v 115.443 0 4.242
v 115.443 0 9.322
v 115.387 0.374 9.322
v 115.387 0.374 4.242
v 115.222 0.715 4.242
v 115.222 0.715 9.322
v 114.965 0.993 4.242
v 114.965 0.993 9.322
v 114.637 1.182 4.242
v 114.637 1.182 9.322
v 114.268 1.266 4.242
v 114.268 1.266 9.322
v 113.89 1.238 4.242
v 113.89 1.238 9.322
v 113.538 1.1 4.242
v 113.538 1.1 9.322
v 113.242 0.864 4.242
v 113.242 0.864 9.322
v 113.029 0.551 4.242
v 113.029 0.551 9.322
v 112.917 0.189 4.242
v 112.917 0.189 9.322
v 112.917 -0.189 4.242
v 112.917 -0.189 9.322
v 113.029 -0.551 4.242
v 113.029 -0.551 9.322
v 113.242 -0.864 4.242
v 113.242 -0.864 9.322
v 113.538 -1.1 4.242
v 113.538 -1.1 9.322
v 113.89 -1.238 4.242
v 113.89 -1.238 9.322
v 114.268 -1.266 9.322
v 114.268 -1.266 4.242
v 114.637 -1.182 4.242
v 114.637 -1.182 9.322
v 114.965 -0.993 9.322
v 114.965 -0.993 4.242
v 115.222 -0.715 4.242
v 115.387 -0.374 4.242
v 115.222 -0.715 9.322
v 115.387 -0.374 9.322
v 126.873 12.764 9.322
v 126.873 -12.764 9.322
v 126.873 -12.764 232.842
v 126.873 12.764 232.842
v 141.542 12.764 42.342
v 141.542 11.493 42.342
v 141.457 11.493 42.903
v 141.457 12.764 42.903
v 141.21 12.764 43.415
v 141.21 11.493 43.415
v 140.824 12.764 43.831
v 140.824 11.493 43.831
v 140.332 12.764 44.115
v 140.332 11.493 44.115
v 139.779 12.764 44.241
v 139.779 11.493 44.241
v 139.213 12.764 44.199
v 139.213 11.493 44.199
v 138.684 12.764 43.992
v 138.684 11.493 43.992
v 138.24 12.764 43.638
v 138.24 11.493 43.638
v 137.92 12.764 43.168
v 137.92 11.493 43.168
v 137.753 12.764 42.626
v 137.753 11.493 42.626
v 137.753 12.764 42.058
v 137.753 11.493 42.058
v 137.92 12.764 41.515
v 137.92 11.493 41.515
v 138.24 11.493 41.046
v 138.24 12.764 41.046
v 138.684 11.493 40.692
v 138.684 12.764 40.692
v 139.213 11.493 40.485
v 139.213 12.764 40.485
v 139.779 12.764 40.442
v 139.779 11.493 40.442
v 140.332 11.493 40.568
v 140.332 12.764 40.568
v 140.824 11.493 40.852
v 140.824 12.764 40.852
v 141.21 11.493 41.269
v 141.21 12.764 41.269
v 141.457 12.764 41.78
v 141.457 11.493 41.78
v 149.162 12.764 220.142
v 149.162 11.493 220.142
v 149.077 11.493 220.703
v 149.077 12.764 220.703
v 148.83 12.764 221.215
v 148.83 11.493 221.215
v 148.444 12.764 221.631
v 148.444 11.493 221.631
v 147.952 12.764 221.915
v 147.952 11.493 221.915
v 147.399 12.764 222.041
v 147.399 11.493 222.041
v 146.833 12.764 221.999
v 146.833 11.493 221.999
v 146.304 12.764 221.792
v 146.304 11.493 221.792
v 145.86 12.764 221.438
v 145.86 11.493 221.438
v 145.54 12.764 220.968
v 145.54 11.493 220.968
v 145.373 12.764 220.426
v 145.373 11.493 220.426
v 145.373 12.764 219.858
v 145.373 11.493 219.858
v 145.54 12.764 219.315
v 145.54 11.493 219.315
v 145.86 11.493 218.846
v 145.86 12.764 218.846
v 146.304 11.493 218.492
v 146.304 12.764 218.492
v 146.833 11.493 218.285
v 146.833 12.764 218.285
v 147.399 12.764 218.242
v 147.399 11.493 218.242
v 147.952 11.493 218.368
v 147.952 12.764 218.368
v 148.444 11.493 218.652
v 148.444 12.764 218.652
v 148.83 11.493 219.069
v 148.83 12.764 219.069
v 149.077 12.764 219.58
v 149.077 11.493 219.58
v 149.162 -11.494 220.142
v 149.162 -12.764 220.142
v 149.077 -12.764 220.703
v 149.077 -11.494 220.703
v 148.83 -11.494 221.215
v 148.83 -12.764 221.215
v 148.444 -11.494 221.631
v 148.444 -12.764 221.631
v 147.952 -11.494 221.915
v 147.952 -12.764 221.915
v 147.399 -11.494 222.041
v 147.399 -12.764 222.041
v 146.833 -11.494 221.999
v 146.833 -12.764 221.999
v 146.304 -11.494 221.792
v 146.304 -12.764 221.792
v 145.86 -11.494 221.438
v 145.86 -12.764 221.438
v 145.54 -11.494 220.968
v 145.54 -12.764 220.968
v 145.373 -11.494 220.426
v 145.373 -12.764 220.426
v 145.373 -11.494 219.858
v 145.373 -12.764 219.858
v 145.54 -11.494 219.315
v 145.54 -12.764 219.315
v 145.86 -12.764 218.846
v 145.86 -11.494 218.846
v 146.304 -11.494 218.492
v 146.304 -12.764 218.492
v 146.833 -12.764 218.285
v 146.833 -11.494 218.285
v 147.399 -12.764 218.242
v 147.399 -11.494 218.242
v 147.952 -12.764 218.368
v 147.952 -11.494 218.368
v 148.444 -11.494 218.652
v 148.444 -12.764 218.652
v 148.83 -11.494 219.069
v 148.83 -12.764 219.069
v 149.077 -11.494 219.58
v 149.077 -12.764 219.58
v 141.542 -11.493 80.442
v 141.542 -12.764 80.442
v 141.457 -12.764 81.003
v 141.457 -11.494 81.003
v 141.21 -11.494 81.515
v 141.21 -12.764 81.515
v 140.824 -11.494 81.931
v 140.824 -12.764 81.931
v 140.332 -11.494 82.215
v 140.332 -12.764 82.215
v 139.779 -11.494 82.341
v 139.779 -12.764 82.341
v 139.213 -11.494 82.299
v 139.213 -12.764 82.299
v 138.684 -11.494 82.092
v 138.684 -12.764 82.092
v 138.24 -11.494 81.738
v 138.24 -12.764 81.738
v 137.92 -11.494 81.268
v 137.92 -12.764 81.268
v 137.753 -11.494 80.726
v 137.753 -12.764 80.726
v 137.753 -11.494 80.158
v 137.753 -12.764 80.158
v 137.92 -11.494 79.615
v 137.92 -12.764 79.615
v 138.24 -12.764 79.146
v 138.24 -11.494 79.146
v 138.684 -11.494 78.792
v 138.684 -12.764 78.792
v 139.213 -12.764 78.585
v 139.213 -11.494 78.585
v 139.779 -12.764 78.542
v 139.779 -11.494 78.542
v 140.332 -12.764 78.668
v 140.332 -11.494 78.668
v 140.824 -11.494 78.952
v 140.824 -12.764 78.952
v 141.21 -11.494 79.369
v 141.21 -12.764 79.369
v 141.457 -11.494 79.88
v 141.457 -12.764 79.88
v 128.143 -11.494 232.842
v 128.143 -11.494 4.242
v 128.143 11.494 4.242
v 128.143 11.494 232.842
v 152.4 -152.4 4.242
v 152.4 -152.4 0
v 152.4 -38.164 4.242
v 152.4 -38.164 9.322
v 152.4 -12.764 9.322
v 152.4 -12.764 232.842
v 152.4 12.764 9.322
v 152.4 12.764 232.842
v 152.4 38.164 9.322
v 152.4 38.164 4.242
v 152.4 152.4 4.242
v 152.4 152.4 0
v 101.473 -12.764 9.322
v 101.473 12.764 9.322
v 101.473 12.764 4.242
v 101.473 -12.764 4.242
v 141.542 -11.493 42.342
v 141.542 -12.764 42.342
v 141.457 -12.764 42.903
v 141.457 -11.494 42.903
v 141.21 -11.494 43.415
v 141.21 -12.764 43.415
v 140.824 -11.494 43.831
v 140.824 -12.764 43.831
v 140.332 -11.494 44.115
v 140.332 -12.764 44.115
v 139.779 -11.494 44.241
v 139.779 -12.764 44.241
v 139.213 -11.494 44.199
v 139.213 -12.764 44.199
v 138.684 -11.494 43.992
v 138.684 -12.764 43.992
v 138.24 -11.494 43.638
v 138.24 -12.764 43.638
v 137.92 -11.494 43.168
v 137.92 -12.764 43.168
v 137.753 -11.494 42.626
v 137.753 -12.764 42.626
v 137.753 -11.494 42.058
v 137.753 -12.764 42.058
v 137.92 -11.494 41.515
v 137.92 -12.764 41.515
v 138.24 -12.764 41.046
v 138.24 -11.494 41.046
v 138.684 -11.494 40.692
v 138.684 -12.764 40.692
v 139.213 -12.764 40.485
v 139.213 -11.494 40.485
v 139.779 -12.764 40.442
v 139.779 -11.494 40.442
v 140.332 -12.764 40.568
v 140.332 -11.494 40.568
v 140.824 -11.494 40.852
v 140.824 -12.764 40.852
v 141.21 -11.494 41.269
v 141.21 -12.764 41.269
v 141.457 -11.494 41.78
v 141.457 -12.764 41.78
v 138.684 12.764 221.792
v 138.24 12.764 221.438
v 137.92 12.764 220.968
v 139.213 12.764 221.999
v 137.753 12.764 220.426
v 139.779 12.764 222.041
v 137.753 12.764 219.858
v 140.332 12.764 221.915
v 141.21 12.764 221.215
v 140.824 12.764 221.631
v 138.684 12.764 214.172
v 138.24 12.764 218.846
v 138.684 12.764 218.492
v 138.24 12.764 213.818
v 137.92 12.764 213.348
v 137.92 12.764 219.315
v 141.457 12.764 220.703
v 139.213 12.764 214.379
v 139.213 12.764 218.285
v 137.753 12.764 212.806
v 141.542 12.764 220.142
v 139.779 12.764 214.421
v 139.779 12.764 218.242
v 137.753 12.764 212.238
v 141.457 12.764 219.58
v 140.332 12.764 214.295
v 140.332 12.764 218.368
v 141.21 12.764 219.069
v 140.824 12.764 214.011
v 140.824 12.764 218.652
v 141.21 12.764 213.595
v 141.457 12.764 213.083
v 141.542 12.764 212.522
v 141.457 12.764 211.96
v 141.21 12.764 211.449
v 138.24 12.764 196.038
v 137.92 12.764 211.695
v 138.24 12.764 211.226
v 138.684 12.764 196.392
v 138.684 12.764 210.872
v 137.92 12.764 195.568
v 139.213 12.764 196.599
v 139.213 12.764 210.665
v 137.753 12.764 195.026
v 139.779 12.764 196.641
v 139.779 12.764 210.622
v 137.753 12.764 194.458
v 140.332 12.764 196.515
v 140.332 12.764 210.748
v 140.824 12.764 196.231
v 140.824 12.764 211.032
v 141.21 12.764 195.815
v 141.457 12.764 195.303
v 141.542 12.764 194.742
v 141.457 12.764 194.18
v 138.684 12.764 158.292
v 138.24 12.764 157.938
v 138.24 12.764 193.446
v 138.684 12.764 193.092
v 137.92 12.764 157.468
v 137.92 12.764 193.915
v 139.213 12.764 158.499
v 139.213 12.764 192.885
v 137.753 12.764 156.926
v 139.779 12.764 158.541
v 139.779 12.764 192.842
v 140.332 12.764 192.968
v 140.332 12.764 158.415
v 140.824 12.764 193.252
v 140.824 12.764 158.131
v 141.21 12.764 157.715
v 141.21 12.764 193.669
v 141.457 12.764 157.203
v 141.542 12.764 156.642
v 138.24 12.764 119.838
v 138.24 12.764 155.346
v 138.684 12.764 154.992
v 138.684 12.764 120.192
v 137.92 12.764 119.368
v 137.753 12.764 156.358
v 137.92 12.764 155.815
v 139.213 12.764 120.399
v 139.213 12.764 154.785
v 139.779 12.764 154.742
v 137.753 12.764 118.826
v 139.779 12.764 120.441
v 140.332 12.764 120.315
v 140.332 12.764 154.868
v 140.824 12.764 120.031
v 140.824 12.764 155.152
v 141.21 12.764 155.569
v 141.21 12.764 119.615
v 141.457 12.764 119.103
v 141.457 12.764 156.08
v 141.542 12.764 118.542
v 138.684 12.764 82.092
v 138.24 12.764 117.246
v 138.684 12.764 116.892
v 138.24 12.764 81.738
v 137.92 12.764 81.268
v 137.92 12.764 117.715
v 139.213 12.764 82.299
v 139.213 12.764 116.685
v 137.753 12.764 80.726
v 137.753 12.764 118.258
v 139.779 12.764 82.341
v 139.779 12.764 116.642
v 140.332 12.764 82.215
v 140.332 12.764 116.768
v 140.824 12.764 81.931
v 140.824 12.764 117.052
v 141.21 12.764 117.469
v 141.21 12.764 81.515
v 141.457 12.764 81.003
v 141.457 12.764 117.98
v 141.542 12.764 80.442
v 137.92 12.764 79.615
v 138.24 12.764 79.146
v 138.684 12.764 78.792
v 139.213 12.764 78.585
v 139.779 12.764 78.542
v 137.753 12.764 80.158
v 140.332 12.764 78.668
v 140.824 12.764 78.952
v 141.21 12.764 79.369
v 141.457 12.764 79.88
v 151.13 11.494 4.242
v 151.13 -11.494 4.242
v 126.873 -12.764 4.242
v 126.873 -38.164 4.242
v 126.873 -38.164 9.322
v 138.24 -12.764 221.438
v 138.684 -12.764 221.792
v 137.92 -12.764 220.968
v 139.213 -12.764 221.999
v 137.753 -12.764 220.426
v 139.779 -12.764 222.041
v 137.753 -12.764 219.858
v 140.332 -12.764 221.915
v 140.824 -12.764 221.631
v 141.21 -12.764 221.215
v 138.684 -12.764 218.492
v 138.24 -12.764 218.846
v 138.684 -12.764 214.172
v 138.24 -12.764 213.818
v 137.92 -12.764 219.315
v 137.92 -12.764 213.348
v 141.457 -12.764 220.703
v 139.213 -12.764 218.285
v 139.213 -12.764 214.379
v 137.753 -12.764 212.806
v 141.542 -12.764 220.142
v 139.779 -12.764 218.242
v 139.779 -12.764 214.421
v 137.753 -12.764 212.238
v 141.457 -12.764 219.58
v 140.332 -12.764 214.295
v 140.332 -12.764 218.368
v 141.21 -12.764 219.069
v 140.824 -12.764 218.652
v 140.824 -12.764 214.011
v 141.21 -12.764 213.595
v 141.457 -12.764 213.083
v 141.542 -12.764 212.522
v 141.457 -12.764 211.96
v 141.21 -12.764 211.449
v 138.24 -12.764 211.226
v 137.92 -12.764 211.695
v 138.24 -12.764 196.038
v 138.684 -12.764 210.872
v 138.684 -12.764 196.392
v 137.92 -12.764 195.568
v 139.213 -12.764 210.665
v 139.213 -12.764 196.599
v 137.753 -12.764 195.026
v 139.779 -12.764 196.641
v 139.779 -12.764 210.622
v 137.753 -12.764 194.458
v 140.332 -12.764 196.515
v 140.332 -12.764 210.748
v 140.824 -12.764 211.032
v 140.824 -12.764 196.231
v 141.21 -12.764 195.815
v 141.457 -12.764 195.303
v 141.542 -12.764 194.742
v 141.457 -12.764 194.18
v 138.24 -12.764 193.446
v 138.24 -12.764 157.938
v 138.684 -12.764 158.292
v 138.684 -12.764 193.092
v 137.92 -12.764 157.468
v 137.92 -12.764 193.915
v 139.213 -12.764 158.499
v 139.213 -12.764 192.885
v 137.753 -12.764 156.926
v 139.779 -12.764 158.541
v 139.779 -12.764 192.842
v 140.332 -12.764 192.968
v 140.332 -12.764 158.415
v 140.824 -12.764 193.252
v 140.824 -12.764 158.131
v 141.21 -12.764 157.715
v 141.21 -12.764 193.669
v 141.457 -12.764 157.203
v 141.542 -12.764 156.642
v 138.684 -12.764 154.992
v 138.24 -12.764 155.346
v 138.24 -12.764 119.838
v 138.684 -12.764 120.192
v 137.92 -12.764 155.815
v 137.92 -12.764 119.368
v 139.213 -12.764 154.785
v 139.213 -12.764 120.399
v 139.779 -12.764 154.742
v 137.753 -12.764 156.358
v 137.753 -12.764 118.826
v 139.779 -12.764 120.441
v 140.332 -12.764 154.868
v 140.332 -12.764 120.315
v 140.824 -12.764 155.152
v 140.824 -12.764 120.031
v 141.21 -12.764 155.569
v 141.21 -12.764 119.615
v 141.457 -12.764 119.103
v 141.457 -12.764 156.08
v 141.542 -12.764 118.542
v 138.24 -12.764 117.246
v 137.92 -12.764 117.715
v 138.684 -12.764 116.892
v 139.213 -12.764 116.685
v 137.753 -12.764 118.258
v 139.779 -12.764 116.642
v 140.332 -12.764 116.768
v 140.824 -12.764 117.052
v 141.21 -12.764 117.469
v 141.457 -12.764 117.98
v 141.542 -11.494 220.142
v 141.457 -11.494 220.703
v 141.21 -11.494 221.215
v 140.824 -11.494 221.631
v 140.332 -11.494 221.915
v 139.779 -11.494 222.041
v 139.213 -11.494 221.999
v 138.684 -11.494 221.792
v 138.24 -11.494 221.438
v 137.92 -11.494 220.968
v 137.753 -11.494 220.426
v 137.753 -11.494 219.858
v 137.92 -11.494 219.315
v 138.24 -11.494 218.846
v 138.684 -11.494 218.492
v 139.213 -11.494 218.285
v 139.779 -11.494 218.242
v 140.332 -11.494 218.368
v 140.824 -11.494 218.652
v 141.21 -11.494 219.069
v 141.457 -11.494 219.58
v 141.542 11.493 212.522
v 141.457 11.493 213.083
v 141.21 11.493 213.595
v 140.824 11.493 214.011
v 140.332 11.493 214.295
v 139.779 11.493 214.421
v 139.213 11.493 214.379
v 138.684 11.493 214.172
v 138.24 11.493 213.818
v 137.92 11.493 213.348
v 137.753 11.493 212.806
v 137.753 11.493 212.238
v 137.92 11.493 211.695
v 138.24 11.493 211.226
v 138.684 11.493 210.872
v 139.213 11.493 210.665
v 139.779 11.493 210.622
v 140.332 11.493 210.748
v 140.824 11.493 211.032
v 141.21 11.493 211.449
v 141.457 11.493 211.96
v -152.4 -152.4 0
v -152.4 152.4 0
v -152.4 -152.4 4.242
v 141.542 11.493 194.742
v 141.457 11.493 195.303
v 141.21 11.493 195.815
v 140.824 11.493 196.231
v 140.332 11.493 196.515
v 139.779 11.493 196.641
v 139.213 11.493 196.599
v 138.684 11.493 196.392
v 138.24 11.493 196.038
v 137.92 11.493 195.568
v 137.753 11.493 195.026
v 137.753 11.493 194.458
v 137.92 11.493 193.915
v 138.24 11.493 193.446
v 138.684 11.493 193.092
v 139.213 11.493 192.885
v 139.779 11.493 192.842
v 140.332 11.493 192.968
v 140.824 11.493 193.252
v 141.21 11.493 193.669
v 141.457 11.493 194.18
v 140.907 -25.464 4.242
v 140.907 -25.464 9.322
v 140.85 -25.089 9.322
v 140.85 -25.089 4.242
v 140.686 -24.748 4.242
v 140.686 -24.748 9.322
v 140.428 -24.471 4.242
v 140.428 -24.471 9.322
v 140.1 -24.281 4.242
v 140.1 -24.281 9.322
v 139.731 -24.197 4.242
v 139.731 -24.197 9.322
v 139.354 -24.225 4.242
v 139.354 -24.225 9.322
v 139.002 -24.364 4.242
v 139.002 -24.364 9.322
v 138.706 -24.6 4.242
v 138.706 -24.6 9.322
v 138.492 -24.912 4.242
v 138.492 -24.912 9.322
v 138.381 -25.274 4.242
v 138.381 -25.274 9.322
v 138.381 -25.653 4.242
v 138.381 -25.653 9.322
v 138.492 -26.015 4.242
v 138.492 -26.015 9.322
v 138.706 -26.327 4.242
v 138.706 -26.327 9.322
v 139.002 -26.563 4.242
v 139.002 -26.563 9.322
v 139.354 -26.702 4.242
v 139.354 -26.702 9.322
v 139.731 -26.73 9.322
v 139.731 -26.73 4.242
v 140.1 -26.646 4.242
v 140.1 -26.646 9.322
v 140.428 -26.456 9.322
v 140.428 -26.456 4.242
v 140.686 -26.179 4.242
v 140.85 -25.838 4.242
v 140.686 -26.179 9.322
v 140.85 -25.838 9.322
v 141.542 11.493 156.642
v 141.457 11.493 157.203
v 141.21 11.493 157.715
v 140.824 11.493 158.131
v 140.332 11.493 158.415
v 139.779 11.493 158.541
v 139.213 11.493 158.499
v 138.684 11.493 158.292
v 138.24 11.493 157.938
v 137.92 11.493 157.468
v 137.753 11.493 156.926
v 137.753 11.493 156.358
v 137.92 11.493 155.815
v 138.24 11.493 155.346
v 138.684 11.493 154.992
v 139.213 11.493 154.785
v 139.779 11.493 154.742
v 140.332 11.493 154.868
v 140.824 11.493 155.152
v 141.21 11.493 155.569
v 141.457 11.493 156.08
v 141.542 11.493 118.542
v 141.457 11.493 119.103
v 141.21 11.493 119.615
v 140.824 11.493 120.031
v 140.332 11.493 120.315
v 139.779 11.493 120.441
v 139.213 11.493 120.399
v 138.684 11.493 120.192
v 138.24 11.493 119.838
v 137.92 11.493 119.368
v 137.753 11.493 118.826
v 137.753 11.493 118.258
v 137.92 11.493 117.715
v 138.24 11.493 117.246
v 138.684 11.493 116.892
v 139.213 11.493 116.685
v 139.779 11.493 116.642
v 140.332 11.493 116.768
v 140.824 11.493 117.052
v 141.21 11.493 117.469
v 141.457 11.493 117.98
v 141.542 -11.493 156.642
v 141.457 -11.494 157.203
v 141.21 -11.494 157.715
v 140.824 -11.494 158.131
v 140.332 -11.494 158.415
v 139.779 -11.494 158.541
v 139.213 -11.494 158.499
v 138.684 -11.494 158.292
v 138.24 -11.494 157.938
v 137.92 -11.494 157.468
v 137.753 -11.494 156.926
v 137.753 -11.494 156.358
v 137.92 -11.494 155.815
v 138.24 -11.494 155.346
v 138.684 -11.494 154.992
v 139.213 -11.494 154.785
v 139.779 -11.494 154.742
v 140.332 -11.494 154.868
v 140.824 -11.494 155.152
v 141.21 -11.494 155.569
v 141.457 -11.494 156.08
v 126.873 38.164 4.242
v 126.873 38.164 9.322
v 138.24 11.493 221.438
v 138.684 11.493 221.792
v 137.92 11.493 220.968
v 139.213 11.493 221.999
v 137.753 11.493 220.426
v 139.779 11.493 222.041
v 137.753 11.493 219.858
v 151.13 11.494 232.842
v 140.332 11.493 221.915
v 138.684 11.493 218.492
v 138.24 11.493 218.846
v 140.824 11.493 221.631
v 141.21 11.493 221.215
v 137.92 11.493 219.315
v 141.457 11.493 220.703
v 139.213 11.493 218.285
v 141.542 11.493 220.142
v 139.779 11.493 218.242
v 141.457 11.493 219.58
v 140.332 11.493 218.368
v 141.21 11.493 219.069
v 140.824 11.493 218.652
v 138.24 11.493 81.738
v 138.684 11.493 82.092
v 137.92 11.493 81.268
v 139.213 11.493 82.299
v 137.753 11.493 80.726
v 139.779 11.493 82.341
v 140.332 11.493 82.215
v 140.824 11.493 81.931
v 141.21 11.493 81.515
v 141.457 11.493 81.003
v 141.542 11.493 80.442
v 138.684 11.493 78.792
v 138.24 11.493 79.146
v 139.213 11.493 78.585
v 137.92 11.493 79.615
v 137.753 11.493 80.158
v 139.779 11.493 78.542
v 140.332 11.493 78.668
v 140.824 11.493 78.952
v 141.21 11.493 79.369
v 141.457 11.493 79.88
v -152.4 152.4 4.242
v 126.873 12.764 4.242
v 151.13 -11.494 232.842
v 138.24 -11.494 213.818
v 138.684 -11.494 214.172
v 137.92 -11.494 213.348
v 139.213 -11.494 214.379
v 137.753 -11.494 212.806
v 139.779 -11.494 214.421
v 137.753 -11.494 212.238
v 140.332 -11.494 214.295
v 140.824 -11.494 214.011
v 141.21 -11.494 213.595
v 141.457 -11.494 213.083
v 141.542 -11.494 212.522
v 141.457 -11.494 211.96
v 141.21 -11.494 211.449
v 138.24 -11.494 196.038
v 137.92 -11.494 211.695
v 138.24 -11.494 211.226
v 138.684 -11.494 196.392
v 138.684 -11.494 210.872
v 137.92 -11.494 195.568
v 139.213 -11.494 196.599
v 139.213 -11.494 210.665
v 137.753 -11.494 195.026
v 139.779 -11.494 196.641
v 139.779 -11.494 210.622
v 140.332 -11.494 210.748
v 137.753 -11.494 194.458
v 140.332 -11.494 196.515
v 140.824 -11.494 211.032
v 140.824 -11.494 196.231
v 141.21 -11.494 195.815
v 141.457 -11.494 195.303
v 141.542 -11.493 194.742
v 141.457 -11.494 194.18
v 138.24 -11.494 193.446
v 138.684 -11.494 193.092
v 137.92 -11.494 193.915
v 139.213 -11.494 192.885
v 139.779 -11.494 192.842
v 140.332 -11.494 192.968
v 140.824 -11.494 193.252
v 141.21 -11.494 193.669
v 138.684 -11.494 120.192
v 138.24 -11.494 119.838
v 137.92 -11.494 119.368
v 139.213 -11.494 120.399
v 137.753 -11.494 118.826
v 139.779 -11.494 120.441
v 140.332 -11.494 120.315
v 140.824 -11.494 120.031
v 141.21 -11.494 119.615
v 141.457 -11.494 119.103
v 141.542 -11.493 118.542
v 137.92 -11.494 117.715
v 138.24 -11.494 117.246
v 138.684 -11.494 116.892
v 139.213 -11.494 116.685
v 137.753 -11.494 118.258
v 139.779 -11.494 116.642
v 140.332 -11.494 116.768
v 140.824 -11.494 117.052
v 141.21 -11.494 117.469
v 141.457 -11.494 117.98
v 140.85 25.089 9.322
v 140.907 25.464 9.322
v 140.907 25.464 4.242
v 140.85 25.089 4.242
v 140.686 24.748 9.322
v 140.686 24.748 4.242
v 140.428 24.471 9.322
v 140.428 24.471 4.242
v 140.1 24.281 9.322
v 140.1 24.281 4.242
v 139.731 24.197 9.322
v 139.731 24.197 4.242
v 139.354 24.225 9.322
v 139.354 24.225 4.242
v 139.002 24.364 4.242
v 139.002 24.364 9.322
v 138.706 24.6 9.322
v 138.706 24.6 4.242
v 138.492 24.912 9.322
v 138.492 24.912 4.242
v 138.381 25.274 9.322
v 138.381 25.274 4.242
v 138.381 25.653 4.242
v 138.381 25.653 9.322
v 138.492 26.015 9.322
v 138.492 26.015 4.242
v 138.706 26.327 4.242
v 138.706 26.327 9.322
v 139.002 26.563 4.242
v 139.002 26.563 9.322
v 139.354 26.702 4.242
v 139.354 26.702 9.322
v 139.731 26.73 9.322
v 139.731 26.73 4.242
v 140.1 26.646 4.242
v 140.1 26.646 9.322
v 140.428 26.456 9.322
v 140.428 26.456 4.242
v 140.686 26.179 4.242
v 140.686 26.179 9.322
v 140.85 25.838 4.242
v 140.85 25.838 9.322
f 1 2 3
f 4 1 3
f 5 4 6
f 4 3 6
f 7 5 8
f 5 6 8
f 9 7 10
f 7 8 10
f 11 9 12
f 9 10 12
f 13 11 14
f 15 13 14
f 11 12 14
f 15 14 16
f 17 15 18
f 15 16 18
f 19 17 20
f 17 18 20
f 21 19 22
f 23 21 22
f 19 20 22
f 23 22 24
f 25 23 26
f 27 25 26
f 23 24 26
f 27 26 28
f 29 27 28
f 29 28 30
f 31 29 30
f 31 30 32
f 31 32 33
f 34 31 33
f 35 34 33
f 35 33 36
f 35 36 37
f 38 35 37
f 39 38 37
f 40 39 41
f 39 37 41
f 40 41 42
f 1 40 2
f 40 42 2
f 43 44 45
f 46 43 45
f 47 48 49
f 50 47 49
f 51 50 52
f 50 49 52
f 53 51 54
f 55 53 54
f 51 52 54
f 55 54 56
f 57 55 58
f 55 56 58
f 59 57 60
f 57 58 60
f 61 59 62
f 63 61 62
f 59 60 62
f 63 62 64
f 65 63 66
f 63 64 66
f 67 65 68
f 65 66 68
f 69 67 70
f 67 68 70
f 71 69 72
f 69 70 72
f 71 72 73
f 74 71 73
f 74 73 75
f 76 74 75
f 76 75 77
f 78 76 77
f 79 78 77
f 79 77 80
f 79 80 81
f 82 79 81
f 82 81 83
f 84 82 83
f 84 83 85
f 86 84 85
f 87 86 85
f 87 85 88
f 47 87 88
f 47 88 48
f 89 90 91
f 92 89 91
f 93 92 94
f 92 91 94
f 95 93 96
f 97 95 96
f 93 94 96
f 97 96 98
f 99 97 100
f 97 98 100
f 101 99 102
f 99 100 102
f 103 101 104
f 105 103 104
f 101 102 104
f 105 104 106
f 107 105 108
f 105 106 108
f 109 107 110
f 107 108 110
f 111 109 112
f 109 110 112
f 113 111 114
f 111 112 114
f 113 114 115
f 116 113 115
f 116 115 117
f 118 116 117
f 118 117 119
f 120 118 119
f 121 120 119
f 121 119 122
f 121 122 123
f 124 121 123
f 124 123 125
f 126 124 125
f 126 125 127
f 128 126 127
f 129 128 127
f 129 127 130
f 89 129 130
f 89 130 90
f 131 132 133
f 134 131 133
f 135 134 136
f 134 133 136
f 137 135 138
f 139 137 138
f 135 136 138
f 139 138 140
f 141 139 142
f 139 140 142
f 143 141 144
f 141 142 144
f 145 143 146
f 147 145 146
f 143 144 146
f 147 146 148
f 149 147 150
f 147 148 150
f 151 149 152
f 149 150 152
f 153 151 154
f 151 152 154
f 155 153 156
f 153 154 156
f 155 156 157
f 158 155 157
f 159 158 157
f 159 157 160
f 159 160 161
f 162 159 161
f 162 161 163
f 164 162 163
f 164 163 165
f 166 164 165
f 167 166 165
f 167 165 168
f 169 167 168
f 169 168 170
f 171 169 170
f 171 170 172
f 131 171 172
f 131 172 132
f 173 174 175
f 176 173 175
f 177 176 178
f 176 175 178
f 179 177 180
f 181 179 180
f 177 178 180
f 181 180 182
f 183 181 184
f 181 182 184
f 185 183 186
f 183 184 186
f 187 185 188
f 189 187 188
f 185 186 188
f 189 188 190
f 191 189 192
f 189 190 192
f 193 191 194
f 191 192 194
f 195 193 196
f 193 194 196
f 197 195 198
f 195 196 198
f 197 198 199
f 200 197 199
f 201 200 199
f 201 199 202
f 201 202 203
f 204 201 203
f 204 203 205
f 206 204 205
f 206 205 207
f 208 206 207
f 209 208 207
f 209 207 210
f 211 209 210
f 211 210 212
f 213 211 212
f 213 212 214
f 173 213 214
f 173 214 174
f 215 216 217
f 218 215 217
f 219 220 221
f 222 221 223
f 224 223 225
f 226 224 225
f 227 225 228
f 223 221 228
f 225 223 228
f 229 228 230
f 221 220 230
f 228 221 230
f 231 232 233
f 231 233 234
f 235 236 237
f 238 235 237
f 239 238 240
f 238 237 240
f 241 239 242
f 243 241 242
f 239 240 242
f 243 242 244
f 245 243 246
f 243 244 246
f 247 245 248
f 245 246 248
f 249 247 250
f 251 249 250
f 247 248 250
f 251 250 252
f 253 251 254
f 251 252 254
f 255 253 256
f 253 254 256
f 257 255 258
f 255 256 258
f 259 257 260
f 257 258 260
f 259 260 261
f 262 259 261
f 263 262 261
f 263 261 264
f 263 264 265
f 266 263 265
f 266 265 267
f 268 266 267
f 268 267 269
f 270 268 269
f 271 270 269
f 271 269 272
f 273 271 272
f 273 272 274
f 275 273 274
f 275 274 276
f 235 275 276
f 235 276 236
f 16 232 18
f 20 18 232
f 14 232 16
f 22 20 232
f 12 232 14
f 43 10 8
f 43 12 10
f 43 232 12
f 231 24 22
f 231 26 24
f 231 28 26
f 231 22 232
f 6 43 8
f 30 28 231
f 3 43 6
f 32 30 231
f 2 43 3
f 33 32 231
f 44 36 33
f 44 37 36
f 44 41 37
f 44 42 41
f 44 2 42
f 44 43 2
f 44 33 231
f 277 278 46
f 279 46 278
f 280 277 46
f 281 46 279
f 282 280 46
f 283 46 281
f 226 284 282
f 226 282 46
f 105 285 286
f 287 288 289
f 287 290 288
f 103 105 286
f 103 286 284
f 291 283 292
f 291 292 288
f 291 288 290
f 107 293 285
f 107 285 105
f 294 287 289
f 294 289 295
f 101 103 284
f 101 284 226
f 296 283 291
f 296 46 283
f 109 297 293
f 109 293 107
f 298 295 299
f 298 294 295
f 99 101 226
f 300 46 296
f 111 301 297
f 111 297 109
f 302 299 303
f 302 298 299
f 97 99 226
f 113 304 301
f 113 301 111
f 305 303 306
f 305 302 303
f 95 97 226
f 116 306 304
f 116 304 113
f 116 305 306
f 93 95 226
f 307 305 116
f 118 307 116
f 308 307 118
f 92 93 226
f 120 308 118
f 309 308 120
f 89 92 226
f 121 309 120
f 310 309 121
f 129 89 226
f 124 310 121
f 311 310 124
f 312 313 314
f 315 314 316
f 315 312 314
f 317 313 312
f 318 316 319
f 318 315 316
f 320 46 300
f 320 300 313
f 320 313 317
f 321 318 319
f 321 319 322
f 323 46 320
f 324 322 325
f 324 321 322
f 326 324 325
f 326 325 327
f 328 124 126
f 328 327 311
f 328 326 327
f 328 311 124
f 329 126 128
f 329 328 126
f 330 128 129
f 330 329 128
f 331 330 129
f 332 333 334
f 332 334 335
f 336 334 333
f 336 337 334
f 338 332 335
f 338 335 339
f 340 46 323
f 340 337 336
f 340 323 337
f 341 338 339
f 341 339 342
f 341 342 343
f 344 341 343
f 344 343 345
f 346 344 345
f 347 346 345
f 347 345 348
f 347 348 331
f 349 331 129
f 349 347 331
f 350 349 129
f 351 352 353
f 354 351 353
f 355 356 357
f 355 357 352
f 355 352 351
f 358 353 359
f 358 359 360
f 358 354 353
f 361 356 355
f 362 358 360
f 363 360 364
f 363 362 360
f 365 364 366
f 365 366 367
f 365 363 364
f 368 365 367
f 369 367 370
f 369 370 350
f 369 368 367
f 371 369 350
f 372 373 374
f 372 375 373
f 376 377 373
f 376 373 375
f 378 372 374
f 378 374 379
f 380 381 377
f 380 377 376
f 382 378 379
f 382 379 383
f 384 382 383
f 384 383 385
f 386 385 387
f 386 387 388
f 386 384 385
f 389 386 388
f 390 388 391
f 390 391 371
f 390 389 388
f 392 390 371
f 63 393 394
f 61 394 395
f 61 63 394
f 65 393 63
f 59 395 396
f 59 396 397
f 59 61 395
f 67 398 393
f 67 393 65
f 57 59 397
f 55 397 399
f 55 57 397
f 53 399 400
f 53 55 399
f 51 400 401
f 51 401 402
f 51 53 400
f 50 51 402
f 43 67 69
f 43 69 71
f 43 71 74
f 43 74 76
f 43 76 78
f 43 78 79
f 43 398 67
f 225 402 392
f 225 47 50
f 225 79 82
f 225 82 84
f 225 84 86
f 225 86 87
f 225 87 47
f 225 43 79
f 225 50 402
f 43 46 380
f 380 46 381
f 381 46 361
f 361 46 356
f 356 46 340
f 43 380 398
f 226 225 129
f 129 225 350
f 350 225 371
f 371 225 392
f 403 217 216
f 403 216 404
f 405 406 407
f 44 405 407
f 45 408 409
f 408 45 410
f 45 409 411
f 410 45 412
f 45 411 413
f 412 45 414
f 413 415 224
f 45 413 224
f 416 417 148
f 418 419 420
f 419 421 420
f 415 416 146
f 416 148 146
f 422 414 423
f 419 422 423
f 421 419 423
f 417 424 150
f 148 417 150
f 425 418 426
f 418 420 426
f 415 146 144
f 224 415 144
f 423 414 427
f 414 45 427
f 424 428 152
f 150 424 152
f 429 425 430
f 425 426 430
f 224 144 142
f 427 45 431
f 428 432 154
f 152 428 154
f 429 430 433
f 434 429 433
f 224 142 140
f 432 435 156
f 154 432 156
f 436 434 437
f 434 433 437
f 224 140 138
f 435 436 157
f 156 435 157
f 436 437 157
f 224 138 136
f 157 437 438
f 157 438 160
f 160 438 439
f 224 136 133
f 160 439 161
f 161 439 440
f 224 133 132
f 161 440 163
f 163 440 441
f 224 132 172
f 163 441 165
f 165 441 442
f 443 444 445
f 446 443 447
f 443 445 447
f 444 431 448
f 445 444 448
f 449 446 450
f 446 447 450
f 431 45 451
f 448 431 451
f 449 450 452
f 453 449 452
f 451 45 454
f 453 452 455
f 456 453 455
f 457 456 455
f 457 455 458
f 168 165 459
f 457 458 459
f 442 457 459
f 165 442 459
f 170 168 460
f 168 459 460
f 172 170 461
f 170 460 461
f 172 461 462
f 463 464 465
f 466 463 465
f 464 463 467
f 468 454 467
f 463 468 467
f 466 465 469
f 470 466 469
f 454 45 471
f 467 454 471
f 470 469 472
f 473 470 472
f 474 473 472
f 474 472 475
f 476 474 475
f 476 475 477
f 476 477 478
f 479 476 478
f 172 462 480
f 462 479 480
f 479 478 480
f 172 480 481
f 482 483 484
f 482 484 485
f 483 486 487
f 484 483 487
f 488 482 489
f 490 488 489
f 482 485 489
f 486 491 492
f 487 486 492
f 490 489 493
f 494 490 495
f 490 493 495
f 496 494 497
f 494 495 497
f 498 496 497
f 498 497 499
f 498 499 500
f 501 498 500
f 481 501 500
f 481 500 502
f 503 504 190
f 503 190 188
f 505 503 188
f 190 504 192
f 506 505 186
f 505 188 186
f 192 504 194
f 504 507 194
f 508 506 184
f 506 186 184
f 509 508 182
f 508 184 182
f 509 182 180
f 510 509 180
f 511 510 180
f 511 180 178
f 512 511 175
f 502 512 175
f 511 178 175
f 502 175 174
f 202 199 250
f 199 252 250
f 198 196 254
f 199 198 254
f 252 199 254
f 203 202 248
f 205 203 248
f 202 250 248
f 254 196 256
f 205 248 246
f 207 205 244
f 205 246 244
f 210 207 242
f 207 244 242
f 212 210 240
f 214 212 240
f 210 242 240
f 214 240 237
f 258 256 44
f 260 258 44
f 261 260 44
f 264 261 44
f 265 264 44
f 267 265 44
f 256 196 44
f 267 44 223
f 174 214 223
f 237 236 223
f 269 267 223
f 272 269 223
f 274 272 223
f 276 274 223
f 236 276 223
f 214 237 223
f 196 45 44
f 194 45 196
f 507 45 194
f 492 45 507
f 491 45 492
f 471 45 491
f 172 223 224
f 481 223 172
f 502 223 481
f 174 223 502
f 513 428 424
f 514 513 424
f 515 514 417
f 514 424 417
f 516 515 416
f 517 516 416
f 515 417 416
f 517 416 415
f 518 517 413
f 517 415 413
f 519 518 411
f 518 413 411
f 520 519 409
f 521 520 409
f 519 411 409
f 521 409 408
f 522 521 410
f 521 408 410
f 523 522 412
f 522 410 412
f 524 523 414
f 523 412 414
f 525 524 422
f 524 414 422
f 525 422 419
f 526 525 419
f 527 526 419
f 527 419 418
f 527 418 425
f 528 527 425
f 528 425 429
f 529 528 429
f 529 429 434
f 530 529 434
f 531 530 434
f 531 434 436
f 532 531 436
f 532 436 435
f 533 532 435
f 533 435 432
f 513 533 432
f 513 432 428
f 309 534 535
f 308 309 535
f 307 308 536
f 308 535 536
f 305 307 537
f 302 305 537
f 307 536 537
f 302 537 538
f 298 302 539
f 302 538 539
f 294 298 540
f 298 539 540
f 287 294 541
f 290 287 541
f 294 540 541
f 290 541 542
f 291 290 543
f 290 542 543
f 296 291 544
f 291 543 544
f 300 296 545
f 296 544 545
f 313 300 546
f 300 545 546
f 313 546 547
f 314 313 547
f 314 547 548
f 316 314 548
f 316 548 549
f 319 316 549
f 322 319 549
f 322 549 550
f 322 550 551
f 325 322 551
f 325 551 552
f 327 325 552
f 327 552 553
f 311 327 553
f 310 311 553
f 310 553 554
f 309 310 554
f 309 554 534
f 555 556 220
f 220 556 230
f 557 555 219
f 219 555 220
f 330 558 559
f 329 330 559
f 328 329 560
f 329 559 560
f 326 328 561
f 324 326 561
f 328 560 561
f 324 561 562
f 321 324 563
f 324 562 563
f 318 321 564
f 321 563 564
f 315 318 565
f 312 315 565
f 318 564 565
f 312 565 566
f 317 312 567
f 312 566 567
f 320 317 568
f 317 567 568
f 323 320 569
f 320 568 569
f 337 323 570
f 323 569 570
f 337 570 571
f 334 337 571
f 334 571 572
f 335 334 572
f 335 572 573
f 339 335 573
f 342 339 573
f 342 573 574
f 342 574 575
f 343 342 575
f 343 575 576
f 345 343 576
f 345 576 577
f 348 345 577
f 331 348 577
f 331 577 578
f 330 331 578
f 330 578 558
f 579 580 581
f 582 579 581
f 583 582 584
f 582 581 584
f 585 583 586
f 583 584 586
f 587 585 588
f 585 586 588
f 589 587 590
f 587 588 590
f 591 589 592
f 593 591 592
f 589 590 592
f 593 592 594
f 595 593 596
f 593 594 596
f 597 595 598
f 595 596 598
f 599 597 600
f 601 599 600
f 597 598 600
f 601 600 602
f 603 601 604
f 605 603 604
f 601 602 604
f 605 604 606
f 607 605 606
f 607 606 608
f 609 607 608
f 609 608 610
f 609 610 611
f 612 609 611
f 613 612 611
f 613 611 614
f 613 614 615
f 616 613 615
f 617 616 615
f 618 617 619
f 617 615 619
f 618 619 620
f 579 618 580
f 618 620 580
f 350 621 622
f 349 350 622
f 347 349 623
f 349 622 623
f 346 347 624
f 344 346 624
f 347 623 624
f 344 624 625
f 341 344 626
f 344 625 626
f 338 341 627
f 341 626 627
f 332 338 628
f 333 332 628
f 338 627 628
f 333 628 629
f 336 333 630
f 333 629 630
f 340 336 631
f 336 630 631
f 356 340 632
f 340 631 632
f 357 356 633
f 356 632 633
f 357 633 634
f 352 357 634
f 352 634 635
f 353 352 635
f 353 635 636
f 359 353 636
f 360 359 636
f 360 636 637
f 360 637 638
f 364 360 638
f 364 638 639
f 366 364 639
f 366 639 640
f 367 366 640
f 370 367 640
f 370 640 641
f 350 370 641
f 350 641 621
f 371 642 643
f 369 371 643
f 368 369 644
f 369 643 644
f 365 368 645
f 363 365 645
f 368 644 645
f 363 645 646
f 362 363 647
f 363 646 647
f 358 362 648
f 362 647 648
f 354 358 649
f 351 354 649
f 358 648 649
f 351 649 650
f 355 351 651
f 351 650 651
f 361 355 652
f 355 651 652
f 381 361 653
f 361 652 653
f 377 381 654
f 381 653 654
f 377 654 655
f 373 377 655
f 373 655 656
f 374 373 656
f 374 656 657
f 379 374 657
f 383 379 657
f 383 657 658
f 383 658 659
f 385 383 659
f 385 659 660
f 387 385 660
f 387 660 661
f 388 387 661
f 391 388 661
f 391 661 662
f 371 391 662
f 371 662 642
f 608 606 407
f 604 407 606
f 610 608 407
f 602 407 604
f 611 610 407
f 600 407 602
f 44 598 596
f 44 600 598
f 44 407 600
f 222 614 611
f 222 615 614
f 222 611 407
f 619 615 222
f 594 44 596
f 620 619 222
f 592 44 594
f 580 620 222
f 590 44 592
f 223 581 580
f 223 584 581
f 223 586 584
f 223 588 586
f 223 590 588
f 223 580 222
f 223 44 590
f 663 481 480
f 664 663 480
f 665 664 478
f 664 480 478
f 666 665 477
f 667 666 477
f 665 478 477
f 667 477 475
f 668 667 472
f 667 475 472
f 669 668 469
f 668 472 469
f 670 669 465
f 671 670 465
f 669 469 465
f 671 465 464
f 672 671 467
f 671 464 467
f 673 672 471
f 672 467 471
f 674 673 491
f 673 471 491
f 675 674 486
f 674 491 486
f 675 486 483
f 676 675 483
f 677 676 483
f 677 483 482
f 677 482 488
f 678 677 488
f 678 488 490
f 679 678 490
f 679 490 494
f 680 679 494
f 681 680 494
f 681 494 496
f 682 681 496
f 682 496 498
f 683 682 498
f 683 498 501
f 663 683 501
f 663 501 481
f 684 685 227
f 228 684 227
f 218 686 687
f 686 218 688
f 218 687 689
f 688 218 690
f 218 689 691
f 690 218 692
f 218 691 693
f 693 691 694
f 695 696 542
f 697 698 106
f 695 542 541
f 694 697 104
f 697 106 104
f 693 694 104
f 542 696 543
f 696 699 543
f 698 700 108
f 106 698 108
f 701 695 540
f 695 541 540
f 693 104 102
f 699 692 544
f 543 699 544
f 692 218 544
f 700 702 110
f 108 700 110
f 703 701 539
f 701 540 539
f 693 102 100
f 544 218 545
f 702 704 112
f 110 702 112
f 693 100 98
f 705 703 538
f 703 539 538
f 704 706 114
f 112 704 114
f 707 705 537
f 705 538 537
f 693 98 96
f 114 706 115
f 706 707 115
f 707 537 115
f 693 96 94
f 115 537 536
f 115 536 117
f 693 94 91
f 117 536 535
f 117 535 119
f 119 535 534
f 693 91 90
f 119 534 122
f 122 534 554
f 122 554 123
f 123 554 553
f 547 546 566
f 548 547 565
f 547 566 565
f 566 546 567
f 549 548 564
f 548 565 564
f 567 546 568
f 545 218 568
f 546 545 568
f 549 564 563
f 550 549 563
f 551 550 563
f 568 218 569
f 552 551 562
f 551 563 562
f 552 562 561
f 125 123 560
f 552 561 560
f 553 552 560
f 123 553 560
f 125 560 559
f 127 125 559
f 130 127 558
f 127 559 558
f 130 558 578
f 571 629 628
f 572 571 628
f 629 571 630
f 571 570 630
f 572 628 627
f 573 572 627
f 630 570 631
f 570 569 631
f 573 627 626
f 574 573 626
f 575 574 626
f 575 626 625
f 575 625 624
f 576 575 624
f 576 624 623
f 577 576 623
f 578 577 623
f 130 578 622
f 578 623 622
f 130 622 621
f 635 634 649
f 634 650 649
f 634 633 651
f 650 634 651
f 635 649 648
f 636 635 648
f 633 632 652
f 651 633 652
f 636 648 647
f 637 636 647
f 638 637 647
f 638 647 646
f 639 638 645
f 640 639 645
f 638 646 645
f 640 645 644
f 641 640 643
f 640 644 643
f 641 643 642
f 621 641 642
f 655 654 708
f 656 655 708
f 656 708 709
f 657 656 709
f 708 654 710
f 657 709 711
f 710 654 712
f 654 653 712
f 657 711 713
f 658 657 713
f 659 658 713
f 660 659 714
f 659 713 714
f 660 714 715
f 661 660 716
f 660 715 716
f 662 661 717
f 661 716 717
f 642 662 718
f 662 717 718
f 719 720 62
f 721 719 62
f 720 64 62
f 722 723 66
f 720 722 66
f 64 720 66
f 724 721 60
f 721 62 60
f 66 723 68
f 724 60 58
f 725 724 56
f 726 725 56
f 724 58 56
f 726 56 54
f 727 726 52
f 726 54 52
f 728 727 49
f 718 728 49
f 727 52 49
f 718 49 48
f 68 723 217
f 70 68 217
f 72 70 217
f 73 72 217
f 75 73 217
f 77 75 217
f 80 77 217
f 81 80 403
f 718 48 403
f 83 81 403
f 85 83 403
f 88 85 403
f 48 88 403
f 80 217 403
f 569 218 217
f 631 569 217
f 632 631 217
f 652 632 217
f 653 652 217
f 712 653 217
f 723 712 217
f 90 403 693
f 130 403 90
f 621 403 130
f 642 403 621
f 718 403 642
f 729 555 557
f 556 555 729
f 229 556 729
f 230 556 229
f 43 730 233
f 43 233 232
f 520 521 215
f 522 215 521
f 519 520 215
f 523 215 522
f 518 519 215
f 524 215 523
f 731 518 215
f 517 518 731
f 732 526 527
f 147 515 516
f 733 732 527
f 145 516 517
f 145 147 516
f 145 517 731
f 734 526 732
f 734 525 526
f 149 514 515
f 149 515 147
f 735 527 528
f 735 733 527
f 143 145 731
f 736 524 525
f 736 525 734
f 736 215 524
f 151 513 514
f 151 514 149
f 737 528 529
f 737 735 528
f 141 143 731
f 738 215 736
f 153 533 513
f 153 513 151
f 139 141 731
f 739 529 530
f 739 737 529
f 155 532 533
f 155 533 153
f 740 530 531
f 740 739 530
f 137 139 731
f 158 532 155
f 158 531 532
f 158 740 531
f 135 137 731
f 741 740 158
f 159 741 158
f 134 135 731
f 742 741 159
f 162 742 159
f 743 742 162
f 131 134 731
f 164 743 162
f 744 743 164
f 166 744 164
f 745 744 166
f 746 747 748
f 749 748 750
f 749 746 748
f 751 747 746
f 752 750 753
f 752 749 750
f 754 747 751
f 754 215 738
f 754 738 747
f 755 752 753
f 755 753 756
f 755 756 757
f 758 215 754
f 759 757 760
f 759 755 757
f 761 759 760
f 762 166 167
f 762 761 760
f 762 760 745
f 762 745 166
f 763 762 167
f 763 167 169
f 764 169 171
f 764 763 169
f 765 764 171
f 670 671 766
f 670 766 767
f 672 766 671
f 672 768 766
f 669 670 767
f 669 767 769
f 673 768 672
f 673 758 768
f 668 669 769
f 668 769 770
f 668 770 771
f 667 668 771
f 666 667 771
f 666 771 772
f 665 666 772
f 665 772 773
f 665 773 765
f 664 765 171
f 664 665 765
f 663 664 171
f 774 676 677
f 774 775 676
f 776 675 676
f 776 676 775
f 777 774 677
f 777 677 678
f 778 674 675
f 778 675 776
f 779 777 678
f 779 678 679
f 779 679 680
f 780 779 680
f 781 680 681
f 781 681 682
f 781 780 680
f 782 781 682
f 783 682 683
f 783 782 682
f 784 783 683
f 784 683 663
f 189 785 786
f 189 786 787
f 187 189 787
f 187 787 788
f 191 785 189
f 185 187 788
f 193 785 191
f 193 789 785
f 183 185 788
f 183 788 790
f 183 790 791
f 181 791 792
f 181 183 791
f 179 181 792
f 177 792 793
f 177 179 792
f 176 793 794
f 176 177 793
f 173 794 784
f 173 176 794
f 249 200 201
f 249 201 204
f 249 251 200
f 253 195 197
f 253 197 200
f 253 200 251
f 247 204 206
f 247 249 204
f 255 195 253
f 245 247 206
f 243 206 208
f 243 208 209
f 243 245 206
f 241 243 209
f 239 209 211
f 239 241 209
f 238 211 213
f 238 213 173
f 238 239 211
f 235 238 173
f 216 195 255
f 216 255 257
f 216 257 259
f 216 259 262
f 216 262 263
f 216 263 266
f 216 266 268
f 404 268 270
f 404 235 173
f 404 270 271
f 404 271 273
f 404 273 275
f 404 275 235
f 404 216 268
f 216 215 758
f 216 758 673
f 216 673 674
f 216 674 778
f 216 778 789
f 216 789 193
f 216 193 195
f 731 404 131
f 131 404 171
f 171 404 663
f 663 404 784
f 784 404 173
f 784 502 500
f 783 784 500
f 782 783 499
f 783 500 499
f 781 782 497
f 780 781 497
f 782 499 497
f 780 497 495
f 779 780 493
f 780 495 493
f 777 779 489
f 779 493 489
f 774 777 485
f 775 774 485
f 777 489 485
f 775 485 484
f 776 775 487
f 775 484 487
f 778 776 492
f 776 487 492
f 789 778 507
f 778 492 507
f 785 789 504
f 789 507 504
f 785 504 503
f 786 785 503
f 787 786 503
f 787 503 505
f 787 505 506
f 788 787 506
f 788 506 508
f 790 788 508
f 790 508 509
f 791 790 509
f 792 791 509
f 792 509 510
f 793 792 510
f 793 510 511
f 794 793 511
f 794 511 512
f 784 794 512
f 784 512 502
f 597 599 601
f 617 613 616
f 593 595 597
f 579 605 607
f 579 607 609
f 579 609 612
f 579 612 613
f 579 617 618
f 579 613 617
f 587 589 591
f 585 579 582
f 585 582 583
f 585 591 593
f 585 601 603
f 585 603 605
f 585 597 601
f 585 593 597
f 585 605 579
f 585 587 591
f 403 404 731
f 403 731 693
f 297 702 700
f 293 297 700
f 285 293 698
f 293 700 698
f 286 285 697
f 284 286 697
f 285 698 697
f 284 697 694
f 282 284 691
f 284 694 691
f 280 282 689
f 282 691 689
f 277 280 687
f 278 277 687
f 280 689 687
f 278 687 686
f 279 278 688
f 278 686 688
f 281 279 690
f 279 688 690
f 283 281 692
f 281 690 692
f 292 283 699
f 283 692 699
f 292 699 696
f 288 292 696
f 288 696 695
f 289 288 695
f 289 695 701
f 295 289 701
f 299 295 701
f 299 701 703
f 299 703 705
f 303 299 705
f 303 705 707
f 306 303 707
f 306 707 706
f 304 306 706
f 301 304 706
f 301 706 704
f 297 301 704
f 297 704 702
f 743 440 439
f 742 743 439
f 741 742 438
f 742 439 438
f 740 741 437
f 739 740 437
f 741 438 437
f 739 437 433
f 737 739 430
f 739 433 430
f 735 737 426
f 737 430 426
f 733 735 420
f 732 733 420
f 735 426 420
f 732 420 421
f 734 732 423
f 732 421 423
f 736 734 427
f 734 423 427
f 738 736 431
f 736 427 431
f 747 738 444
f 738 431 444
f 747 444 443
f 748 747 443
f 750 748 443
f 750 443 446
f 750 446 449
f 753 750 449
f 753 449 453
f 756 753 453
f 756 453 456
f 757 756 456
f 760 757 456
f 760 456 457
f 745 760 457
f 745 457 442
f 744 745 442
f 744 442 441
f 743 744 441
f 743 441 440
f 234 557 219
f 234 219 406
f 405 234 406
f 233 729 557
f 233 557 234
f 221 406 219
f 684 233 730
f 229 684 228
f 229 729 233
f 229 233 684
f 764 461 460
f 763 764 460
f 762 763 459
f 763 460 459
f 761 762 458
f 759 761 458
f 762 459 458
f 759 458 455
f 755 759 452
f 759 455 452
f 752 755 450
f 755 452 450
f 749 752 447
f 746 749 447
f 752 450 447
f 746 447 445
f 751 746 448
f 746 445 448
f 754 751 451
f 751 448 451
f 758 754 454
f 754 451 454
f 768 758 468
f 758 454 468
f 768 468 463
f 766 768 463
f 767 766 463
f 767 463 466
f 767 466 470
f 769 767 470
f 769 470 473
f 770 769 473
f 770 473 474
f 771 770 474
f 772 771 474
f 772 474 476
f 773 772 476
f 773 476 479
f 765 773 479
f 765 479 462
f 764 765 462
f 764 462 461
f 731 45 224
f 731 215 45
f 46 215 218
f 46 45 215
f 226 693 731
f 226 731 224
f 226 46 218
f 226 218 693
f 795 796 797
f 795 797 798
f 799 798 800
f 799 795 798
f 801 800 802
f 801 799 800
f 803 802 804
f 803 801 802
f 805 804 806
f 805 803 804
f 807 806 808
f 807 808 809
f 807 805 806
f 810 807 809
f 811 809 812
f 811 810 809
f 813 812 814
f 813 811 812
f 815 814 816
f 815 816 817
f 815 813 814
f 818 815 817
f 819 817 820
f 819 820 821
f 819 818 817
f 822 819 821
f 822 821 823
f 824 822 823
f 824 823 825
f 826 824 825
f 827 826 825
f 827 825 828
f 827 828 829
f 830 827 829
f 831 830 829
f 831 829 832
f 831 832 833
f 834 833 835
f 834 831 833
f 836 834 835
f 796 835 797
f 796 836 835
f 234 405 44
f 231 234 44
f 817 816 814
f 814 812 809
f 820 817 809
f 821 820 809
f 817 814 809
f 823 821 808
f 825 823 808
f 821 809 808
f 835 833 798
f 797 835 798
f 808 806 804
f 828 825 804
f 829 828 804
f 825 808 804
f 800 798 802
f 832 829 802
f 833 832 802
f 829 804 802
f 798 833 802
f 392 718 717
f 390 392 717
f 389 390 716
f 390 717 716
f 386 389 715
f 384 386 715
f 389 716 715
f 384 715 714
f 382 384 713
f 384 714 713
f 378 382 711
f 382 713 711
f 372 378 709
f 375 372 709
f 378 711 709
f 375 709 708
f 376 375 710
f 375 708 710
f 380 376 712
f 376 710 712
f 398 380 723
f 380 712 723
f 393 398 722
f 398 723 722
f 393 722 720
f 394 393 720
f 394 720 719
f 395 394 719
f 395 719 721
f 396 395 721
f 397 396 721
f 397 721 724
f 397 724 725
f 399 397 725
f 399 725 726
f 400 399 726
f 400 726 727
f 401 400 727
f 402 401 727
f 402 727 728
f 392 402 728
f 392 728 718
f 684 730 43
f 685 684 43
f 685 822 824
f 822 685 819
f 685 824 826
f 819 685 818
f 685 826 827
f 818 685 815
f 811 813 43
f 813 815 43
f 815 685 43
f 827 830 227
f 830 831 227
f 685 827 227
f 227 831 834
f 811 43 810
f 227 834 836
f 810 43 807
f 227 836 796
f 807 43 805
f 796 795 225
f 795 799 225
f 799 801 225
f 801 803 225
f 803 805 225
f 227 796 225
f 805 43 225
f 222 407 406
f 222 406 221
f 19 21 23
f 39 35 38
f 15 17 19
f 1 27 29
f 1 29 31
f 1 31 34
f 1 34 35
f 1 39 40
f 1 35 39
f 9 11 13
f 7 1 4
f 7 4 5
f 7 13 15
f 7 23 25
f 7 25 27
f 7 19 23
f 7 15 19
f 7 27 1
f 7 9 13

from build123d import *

# Parameters (mm, degrees)
F0_W      = 304.8
F0_H      = 304.8
F1_DEPTH  = 4.2418
F2_W      = 25.527
F2_H      = 25.527
F2_W_2    = 22.987
F2_H_2    = 22.987
F3_DEPTH  = 228.6
F4_R      = 1.905
F5_DEPTH  = 165.1645
F6_W      = 25.527
F6_H      = 5.08
F7_DEPTH  = 25.4
F8_R      = 1.27
F9_DEPTH  = 5.08
F11_W     = 25.527
F11_H     = 5.08
F12_DEPTH = 25.4
F13_R     = 1.27
F14_DEPTH = 5.08
F15_R     = 1.905
F16_DEPTH = 165.1645


with BuildPart() as f1:
    # F0 (on Top) → F1 (new body)
    with BuildSketch(Plane.XY):
        Rectangle(F0_W, F0_H)
    extrude(amount=F1_DEPTH)

    # F2 (on face) → F3 (join)
    with BuildSketch(Plane.XY.offset(4.2418)):
        with Locations((139.6365, 0)):
            Rectangle(F2_W, F2_H)
        with Locations((139.6365, 0)):
            Rectangle(F2_W_2, F2_H_2, mode=Mode.SUBTRACT)
    extrude(amount=F3_DEPTH)

    # F4 (on face) → F5 (cut, through all)
    with BuildSketch(Plane.XZ.offset(12.7635)):
        with Locations((139.6365, 42.3418)):
            Circle(F4_R)
        with Locations((139.6365, 80.4418)):
            Circle(F4_R)
        with Locations((139.6365, 118.5418)):
            Circle(F4_R)
        with Locations((139.6365, 156.6418)):
            Circle(F4_R)
        with Locations((139.6365, 194.7418)):
            Circle(F4_R)
    extrude(amount=-F5_DEPTH, mode=Mode.SUBTRACT)

    # F6 (on face) → F7 (join)
    with BuildSketch(Plane.XZ.offset(12.7635)):
        with Locations((139.6365, 6.7818)):
            Rectangle(F6_W, F6_H)
    extrude(amount=F7_DEPTH)

    # F8 (on face) → F9 (cut)
    with BuildSketch(Plane.XY.offset(9.3218)):
        with Locations((139.6365, -25.4635)):
            Circle(F8_R)
    extrude(amount=-F9_DEPTH, mode=Mode.SUBTRACT)

    # F10: F1 across plane


with BuildPart() as f1_1:
    add(f1.part)
    add(f1.part.mirror(Plane.XZ))

    # F11 (on face) → F12 (join)
    with BuildSketch(Plane(origin=(126.873, 0, 0), x_dir=(0, -1, 0), z_dir=(-1, 0, 0))):
        with Locations((0, 6.7818)):
            Rectangle(F11_W, F11_H)
    extrude(amount=F12_DEPTH)

    # F13 (on face) → F14 (cut)
    with BuildSketch(Plane.XY.offset(9.3218)):
        with Locations((114.173, 0)):
            Circle(F13_R)
    extrude(amount=-F14_DEPTH, mode=Mode.SUBTRACT)

    # F15 (on face) → F16 (cut, through all)
    with BuildSketch(Plane.XZ.offset(12.7635)):
        with Locations((139.6365, 220.1418)):
            Circle(F15_R)
        with Locations((147.2565, 220.1418)):
            Circle(F15_R)
        with Locations((139.6365, 212.5218)):
            Circle(F15_R)
    extrude(amount=-F16_DEPTH, mode=Mode.SUBTRACT)


solid = f1_1.part
